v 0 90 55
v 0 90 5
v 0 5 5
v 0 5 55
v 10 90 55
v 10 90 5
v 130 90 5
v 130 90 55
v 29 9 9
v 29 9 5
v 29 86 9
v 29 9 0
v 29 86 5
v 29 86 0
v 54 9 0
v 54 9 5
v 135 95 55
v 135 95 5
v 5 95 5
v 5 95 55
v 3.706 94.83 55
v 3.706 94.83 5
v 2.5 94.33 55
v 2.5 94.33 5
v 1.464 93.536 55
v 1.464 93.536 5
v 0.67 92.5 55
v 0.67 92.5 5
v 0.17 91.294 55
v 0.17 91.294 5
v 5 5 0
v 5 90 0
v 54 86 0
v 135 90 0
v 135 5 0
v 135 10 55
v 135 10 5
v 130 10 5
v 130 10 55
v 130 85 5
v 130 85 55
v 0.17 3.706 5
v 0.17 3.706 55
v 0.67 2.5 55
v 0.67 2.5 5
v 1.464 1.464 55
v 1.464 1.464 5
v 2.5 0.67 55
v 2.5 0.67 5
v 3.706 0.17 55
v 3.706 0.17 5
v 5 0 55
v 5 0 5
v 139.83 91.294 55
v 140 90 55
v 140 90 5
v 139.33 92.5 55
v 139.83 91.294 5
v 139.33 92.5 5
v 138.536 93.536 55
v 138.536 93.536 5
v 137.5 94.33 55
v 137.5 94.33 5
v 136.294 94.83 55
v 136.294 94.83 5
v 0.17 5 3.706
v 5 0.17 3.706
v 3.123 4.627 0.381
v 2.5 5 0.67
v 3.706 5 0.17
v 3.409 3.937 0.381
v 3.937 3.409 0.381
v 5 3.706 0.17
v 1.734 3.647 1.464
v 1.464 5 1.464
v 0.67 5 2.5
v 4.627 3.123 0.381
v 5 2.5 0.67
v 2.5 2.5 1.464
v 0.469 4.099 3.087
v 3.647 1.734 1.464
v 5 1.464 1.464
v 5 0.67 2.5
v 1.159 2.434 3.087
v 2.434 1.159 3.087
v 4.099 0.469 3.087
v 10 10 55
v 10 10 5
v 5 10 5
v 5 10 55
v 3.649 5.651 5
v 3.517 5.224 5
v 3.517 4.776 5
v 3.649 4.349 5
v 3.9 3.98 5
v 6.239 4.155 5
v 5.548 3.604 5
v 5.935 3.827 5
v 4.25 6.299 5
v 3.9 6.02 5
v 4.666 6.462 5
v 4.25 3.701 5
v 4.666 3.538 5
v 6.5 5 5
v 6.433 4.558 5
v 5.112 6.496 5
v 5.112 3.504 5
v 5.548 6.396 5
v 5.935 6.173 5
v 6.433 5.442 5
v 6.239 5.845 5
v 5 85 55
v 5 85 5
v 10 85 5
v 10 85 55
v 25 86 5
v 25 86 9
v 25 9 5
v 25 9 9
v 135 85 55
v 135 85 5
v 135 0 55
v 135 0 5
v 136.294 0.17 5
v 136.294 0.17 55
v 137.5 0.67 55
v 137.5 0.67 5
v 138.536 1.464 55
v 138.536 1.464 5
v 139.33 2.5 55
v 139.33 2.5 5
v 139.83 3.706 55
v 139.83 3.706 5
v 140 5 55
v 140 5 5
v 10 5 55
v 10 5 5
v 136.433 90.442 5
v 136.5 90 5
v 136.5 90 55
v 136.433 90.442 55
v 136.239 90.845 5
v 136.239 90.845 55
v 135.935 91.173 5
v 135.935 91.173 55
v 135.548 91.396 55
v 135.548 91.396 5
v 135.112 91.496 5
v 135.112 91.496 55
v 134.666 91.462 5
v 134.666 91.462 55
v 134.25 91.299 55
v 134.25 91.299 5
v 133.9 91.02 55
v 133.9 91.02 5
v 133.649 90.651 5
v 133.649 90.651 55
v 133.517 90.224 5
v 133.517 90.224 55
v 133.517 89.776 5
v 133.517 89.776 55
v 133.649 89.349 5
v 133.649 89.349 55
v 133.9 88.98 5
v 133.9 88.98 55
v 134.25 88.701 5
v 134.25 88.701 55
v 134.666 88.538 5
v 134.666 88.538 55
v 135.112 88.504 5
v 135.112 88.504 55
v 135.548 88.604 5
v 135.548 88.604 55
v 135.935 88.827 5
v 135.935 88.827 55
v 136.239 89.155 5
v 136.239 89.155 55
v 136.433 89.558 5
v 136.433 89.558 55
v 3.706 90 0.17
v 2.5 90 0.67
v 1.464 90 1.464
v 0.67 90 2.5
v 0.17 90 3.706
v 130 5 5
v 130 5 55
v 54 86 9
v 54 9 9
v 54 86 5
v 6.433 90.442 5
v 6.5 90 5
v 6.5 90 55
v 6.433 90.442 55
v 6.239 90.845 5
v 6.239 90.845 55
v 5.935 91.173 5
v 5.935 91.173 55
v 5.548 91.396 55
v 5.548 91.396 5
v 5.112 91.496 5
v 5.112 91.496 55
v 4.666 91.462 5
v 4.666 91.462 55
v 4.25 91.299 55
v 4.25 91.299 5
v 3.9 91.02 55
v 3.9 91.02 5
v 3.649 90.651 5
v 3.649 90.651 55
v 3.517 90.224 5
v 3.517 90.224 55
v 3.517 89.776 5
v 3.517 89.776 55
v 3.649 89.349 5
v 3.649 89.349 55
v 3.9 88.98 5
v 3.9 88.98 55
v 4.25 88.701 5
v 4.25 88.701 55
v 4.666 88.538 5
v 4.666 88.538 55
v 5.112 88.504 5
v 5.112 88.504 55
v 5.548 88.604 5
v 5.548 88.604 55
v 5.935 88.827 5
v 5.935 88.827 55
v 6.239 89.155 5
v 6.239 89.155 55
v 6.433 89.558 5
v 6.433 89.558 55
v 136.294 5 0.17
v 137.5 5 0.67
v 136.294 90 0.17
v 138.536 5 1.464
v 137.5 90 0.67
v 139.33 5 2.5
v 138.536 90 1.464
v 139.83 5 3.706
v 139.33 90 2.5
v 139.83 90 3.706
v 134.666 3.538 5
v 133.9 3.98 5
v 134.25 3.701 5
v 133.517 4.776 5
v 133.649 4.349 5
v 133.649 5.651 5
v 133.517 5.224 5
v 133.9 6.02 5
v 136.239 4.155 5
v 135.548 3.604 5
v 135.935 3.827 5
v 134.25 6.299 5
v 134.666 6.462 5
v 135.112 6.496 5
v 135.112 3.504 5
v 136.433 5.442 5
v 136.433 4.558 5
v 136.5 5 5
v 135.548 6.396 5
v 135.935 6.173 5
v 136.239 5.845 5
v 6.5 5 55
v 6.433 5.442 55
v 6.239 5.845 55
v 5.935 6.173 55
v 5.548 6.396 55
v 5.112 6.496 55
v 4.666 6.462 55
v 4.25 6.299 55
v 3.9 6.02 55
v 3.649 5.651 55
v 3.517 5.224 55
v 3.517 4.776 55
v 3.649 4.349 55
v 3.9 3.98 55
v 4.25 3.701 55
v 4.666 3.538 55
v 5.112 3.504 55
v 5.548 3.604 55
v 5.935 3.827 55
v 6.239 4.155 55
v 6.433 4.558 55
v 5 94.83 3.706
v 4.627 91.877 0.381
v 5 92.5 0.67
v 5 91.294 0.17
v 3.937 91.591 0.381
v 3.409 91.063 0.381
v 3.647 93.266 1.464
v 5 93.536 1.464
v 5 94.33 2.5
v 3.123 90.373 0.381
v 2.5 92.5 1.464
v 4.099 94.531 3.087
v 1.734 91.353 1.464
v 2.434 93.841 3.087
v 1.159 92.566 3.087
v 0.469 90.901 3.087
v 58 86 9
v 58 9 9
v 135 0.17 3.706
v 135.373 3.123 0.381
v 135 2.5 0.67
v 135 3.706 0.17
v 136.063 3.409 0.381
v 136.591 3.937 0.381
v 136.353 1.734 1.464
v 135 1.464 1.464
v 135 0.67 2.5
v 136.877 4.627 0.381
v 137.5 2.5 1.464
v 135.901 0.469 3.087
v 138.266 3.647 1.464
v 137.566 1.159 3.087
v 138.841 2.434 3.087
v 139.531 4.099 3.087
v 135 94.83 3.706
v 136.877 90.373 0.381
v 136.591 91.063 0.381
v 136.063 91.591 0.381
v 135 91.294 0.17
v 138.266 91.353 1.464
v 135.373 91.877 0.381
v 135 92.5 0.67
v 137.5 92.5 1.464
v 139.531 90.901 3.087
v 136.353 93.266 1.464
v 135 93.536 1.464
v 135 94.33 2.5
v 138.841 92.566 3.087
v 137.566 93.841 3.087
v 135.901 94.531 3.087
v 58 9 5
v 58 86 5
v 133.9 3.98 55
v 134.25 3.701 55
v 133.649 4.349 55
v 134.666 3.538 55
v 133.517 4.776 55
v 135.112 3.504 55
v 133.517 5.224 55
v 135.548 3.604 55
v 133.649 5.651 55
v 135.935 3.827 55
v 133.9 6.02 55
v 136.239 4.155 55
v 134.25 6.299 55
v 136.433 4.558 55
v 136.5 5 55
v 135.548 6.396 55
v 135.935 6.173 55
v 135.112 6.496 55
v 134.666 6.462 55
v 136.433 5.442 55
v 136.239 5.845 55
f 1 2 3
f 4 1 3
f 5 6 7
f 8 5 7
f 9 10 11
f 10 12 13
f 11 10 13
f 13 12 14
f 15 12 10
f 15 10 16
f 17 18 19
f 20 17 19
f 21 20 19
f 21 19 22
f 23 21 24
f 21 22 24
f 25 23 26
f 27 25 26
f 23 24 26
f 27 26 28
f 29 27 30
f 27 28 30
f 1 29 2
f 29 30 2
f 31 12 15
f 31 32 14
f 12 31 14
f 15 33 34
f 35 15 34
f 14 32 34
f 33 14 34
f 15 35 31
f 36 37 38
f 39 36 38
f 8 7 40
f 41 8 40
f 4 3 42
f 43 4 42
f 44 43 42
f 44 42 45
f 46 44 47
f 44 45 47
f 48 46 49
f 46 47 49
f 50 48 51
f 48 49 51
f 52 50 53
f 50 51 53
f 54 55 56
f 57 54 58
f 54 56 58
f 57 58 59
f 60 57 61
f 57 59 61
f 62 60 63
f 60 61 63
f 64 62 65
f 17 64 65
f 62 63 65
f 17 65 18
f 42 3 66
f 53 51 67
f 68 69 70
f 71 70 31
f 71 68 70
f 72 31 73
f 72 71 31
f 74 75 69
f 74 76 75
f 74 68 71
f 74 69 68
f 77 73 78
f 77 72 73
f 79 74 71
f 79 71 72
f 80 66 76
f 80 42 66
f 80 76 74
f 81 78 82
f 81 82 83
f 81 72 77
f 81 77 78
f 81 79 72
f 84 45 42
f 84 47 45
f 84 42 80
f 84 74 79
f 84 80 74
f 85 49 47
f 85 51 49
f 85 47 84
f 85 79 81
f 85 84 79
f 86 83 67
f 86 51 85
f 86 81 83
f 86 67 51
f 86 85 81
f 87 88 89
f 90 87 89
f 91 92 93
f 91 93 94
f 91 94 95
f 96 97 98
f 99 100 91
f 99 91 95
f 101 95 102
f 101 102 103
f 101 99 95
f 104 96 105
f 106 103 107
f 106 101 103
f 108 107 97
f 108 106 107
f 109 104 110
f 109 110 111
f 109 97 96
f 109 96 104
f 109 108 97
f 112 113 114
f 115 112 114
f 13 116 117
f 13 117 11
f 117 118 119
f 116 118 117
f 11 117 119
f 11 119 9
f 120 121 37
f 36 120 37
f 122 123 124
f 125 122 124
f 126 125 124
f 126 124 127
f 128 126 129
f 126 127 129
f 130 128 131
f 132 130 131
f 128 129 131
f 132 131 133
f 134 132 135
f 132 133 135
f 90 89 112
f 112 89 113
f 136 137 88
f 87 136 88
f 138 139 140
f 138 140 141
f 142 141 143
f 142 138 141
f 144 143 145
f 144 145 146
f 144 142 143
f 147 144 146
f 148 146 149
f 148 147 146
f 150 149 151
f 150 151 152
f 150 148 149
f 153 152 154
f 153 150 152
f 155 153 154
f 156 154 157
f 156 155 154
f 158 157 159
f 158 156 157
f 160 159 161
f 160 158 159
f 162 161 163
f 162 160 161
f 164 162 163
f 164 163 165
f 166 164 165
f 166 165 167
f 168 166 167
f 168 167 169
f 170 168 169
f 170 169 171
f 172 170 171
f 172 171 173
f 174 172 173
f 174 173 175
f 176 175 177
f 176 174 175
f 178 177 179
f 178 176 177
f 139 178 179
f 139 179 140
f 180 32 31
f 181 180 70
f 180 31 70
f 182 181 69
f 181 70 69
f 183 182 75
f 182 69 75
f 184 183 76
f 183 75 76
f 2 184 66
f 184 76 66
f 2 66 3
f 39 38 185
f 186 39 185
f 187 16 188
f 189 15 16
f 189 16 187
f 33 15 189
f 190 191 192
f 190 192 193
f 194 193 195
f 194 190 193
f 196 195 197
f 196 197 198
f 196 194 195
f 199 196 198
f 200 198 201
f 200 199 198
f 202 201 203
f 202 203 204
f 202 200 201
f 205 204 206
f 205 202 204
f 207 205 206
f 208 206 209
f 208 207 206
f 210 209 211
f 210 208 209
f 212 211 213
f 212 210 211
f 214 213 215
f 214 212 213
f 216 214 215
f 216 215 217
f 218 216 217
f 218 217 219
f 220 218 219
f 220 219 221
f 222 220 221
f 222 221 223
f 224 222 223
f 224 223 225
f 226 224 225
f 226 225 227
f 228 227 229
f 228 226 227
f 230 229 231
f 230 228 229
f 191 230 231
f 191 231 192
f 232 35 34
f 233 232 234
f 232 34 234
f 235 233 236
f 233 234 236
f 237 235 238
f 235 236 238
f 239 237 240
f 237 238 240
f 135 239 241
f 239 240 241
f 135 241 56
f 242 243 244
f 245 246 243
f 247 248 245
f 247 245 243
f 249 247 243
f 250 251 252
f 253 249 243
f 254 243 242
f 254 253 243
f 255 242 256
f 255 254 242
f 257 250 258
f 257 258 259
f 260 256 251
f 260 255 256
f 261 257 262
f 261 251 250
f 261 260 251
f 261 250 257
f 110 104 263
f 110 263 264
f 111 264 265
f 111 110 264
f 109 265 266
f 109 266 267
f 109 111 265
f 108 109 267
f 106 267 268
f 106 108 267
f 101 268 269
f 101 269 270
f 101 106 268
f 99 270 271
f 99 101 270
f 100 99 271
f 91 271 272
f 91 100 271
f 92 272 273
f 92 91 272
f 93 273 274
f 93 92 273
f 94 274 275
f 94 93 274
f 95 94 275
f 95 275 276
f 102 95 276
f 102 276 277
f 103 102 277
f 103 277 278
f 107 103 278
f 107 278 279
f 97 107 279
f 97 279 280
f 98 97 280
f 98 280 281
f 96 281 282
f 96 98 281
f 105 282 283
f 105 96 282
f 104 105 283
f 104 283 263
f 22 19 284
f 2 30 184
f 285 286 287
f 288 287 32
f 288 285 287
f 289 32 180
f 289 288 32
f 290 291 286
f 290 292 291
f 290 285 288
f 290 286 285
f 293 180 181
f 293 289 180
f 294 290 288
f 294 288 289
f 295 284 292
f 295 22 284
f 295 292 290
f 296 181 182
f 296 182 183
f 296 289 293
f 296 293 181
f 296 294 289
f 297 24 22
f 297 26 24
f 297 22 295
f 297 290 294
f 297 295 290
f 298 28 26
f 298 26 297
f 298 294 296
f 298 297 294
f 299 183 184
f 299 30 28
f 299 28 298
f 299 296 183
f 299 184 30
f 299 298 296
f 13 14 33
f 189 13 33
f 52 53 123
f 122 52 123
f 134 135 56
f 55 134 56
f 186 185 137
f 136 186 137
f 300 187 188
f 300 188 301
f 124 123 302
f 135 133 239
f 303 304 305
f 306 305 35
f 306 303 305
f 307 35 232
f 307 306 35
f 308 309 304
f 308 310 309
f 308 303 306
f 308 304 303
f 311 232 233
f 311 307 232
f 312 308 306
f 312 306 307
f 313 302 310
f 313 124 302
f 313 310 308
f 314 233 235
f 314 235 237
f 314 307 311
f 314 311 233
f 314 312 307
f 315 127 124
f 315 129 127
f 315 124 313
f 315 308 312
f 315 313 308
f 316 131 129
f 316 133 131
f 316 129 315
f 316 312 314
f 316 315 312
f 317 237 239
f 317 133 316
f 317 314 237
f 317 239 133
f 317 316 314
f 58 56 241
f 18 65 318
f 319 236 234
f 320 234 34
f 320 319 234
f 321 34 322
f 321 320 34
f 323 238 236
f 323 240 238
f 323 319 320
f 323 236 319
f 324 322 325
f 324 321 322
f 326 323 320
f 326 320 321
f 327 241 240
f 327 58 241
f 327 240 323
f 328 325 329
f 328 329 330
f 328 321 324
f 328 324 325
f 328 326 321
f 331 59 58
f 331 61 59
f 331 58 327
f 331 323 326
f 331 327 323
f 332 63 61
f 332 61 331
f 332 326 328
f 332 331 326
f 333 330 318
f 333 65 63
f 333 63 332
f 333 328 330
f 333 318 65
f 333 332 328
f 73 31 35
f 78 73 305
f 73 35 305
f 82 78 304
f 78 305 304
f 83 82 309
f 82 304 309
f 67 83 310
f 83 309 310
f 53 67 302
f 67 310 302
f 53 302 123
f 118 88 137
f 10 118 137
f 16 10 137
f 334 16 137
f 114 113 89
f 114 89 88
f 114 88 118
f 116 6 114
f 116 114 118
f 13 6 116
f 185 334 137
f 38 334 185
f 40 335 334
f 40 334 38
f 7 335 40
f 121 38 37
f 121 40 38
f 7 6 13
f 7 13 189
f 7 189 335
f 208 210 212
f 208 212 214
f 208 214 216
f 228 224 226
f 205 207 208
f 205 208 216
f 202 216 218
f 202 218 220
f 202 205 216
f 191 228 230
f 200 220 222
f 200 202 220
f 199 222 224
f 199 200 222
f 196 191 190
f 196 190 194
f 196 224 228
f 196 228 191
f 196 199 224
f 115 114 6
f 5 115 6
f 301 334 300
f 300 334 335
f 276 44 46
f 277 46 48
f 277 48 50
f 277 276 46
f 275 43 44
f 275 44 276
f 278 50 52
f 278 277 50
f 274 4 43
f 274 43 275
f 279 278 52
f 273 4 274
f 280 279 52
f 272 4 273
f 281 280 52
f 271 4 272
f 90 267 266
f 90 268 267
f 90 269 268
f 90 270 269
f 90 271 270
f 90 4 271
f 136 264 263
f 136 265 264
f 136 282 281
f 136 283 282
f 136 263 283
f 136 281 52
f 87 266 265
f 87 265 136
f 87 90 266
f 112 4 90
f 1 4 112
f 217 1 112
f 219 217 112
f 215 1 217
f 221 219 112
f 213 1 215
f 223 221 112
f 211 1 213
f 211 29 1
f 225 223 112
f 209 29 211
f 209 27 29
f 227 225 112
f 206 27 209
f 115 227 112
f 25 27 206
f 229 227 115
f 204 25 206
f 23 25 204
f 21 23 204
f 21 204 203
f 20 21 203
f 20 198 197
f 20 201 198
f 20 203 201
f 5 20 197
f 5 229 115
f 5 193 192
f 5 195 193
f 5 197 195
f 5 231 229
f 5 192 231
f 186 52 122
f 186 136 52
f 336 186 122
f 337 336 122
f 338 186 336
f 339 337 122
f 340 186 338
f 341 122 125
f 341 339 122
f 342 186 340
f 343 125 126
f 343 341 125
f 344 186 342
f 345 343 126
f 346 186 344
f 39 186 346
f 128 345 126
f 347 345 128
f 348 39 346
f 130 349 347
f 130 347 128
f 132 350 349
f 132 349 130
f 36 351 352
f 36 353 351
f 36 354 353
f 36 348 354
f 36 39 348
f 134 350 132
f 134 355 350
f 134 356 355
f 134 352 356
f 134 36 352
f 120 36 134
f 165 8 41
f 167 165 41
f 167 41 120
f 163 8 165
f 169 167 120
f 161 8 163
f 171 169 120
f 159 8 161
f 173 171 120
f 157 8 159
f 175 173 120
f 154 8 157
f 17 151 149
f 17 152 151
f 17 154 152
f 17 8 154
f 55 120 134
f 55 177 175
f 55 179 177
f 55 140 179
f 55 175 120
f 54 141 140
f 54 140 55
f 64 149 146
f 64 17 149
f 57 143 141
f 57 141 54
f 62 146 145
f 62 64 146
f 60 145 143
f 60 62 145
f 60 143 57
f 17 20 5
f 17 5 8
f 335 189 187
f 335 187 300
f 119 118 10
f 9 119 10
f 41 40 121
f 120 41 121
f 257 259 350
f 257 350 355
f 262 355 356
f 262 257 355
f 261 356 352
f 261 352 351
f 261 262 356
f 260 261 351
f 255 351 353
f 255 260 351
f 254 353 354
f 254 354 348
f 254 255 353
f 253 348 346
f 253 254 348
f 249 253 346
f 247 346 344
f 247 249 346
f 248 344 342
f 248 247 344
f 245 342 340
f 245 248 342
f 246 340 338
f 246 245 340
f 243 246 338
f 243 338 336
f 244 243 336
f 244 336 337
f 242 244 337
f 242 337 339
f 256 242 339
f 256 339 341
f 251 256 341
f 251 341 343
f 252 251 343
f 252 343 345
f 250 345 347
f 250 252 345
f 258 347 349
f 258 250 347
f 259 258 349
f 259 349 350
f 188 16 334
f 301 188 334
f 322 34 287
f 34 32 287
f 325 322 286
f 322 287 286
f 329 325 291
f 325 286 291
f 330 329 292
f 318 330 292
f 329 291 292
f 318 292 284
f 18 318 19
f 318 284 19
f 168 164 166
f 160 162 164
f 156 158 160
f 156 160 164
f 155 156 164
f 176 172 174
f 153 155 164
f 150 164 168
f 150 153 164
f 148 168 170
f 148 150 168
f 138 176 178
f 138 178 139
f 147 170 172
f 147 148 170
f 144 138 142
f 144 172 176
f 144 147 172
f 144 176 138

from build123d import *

# Parameters (mm, degrees)
F0_W     = 25
F0_H     = 77
F1_DEPTH = 5
F2_R     = 1.5
F3_DEPTH = 50
F4_R     = 5
F5_W     = 4
F5_H     = 77
F6_DEPTH = 4


with BuildPart() as f1:
    # F0 (on Top) → F1 (new body)
    with BuildSketch(Plane.XY):
        with BuildLine():
            ThreePointArc((0, 5), (1.4644660941, 1.4644660941), (5, 0))
            Line((5, 0), (135, 0))
            ThreePointArc((135, 0), (138.5355339059, 1.4644660941), (140, 5))
            Line((140, 5), (140, 90))
            ThreePointArc((140, 90), (138.5355339059, 93.5355339059), (135, 95))
            Line((135, 95), (5, 95))
            ThreePointArc((5, 95), (1.4644660941, 93.5355339059), (0, 90))
            Line((0, 90), (0, 5))
        make_face()
        with Locations((41.5, 47.5)):
            Rectangle(F0_W, F0_H, mode=Mode.SUBTRACT)
    extrude(amount=F1_DEPTH)

    # F2 (on face) → F3 (join)
    with BuildSketch(Plane.XY.offset(5)):
        with BuildLine():
            ThreePointArc((0, 5), (1.4644660941, 1.4644660941), (5, 0))
            Line((5, 0), (135, 0))
            ThreePointArc((135, 0), (138.5355339059, 1.4644660941), (140, 5))
            Line((140, 5), (140, 90))
            ThreePointArc((140, 90), (138.5355339059, 93.5355339059), (135, 95))
            Line((135, 95), (5, 95))
            ThreePointArc((5, 95), (1.4644660941, 93.5355339059), (0, 90))
            Line((0, 90), (0, 5))
        make_face()
        with Locations((5, 5)):
            Circle(F2_R, mode=Mode.SUBTRACT)
        with Locations((135, 5)):
            Circle(F2_R, mode=Mode.SUBTRACT)
        with Locations((5, 90)):
            Circle(F2_R, mode=Mode.SUBTRACT)
        Polygon((10, 9.9999997765), (5, 9.9999997765), (5, 85), (10, 85), (10, 90), (130, 90), (130, 85), (135, 85), (135, 9.9999997765), (130, 9.9999997765), (130, 5), (10, 5), align=None, mode=Mode.SUBTRACT)
        with Locations((135, 90)):
            Circle(F2_R, mode=Mode.SUBTRACT)
    extrude(amount=F3_DEPTH)

    # F4
    f4_edges = [f1.edges().sort_by_distance(p)[0] for p in [
        (70, 95, 0),
    ]]
    fillet(f4_edges, radius=F4_R)

    # F5 (on face) → F6 (join)
    with BuildSketch(Plane.XY.offset(5)):
        with Locations((27, 47.5)):
            Rectangle(F5_W, F5_H)
        with Locations((56, 47.5)):
            Rectangle(F5_W, F5_H)
    extrude(amount=F6_DEPTH)


solid = f1.part
